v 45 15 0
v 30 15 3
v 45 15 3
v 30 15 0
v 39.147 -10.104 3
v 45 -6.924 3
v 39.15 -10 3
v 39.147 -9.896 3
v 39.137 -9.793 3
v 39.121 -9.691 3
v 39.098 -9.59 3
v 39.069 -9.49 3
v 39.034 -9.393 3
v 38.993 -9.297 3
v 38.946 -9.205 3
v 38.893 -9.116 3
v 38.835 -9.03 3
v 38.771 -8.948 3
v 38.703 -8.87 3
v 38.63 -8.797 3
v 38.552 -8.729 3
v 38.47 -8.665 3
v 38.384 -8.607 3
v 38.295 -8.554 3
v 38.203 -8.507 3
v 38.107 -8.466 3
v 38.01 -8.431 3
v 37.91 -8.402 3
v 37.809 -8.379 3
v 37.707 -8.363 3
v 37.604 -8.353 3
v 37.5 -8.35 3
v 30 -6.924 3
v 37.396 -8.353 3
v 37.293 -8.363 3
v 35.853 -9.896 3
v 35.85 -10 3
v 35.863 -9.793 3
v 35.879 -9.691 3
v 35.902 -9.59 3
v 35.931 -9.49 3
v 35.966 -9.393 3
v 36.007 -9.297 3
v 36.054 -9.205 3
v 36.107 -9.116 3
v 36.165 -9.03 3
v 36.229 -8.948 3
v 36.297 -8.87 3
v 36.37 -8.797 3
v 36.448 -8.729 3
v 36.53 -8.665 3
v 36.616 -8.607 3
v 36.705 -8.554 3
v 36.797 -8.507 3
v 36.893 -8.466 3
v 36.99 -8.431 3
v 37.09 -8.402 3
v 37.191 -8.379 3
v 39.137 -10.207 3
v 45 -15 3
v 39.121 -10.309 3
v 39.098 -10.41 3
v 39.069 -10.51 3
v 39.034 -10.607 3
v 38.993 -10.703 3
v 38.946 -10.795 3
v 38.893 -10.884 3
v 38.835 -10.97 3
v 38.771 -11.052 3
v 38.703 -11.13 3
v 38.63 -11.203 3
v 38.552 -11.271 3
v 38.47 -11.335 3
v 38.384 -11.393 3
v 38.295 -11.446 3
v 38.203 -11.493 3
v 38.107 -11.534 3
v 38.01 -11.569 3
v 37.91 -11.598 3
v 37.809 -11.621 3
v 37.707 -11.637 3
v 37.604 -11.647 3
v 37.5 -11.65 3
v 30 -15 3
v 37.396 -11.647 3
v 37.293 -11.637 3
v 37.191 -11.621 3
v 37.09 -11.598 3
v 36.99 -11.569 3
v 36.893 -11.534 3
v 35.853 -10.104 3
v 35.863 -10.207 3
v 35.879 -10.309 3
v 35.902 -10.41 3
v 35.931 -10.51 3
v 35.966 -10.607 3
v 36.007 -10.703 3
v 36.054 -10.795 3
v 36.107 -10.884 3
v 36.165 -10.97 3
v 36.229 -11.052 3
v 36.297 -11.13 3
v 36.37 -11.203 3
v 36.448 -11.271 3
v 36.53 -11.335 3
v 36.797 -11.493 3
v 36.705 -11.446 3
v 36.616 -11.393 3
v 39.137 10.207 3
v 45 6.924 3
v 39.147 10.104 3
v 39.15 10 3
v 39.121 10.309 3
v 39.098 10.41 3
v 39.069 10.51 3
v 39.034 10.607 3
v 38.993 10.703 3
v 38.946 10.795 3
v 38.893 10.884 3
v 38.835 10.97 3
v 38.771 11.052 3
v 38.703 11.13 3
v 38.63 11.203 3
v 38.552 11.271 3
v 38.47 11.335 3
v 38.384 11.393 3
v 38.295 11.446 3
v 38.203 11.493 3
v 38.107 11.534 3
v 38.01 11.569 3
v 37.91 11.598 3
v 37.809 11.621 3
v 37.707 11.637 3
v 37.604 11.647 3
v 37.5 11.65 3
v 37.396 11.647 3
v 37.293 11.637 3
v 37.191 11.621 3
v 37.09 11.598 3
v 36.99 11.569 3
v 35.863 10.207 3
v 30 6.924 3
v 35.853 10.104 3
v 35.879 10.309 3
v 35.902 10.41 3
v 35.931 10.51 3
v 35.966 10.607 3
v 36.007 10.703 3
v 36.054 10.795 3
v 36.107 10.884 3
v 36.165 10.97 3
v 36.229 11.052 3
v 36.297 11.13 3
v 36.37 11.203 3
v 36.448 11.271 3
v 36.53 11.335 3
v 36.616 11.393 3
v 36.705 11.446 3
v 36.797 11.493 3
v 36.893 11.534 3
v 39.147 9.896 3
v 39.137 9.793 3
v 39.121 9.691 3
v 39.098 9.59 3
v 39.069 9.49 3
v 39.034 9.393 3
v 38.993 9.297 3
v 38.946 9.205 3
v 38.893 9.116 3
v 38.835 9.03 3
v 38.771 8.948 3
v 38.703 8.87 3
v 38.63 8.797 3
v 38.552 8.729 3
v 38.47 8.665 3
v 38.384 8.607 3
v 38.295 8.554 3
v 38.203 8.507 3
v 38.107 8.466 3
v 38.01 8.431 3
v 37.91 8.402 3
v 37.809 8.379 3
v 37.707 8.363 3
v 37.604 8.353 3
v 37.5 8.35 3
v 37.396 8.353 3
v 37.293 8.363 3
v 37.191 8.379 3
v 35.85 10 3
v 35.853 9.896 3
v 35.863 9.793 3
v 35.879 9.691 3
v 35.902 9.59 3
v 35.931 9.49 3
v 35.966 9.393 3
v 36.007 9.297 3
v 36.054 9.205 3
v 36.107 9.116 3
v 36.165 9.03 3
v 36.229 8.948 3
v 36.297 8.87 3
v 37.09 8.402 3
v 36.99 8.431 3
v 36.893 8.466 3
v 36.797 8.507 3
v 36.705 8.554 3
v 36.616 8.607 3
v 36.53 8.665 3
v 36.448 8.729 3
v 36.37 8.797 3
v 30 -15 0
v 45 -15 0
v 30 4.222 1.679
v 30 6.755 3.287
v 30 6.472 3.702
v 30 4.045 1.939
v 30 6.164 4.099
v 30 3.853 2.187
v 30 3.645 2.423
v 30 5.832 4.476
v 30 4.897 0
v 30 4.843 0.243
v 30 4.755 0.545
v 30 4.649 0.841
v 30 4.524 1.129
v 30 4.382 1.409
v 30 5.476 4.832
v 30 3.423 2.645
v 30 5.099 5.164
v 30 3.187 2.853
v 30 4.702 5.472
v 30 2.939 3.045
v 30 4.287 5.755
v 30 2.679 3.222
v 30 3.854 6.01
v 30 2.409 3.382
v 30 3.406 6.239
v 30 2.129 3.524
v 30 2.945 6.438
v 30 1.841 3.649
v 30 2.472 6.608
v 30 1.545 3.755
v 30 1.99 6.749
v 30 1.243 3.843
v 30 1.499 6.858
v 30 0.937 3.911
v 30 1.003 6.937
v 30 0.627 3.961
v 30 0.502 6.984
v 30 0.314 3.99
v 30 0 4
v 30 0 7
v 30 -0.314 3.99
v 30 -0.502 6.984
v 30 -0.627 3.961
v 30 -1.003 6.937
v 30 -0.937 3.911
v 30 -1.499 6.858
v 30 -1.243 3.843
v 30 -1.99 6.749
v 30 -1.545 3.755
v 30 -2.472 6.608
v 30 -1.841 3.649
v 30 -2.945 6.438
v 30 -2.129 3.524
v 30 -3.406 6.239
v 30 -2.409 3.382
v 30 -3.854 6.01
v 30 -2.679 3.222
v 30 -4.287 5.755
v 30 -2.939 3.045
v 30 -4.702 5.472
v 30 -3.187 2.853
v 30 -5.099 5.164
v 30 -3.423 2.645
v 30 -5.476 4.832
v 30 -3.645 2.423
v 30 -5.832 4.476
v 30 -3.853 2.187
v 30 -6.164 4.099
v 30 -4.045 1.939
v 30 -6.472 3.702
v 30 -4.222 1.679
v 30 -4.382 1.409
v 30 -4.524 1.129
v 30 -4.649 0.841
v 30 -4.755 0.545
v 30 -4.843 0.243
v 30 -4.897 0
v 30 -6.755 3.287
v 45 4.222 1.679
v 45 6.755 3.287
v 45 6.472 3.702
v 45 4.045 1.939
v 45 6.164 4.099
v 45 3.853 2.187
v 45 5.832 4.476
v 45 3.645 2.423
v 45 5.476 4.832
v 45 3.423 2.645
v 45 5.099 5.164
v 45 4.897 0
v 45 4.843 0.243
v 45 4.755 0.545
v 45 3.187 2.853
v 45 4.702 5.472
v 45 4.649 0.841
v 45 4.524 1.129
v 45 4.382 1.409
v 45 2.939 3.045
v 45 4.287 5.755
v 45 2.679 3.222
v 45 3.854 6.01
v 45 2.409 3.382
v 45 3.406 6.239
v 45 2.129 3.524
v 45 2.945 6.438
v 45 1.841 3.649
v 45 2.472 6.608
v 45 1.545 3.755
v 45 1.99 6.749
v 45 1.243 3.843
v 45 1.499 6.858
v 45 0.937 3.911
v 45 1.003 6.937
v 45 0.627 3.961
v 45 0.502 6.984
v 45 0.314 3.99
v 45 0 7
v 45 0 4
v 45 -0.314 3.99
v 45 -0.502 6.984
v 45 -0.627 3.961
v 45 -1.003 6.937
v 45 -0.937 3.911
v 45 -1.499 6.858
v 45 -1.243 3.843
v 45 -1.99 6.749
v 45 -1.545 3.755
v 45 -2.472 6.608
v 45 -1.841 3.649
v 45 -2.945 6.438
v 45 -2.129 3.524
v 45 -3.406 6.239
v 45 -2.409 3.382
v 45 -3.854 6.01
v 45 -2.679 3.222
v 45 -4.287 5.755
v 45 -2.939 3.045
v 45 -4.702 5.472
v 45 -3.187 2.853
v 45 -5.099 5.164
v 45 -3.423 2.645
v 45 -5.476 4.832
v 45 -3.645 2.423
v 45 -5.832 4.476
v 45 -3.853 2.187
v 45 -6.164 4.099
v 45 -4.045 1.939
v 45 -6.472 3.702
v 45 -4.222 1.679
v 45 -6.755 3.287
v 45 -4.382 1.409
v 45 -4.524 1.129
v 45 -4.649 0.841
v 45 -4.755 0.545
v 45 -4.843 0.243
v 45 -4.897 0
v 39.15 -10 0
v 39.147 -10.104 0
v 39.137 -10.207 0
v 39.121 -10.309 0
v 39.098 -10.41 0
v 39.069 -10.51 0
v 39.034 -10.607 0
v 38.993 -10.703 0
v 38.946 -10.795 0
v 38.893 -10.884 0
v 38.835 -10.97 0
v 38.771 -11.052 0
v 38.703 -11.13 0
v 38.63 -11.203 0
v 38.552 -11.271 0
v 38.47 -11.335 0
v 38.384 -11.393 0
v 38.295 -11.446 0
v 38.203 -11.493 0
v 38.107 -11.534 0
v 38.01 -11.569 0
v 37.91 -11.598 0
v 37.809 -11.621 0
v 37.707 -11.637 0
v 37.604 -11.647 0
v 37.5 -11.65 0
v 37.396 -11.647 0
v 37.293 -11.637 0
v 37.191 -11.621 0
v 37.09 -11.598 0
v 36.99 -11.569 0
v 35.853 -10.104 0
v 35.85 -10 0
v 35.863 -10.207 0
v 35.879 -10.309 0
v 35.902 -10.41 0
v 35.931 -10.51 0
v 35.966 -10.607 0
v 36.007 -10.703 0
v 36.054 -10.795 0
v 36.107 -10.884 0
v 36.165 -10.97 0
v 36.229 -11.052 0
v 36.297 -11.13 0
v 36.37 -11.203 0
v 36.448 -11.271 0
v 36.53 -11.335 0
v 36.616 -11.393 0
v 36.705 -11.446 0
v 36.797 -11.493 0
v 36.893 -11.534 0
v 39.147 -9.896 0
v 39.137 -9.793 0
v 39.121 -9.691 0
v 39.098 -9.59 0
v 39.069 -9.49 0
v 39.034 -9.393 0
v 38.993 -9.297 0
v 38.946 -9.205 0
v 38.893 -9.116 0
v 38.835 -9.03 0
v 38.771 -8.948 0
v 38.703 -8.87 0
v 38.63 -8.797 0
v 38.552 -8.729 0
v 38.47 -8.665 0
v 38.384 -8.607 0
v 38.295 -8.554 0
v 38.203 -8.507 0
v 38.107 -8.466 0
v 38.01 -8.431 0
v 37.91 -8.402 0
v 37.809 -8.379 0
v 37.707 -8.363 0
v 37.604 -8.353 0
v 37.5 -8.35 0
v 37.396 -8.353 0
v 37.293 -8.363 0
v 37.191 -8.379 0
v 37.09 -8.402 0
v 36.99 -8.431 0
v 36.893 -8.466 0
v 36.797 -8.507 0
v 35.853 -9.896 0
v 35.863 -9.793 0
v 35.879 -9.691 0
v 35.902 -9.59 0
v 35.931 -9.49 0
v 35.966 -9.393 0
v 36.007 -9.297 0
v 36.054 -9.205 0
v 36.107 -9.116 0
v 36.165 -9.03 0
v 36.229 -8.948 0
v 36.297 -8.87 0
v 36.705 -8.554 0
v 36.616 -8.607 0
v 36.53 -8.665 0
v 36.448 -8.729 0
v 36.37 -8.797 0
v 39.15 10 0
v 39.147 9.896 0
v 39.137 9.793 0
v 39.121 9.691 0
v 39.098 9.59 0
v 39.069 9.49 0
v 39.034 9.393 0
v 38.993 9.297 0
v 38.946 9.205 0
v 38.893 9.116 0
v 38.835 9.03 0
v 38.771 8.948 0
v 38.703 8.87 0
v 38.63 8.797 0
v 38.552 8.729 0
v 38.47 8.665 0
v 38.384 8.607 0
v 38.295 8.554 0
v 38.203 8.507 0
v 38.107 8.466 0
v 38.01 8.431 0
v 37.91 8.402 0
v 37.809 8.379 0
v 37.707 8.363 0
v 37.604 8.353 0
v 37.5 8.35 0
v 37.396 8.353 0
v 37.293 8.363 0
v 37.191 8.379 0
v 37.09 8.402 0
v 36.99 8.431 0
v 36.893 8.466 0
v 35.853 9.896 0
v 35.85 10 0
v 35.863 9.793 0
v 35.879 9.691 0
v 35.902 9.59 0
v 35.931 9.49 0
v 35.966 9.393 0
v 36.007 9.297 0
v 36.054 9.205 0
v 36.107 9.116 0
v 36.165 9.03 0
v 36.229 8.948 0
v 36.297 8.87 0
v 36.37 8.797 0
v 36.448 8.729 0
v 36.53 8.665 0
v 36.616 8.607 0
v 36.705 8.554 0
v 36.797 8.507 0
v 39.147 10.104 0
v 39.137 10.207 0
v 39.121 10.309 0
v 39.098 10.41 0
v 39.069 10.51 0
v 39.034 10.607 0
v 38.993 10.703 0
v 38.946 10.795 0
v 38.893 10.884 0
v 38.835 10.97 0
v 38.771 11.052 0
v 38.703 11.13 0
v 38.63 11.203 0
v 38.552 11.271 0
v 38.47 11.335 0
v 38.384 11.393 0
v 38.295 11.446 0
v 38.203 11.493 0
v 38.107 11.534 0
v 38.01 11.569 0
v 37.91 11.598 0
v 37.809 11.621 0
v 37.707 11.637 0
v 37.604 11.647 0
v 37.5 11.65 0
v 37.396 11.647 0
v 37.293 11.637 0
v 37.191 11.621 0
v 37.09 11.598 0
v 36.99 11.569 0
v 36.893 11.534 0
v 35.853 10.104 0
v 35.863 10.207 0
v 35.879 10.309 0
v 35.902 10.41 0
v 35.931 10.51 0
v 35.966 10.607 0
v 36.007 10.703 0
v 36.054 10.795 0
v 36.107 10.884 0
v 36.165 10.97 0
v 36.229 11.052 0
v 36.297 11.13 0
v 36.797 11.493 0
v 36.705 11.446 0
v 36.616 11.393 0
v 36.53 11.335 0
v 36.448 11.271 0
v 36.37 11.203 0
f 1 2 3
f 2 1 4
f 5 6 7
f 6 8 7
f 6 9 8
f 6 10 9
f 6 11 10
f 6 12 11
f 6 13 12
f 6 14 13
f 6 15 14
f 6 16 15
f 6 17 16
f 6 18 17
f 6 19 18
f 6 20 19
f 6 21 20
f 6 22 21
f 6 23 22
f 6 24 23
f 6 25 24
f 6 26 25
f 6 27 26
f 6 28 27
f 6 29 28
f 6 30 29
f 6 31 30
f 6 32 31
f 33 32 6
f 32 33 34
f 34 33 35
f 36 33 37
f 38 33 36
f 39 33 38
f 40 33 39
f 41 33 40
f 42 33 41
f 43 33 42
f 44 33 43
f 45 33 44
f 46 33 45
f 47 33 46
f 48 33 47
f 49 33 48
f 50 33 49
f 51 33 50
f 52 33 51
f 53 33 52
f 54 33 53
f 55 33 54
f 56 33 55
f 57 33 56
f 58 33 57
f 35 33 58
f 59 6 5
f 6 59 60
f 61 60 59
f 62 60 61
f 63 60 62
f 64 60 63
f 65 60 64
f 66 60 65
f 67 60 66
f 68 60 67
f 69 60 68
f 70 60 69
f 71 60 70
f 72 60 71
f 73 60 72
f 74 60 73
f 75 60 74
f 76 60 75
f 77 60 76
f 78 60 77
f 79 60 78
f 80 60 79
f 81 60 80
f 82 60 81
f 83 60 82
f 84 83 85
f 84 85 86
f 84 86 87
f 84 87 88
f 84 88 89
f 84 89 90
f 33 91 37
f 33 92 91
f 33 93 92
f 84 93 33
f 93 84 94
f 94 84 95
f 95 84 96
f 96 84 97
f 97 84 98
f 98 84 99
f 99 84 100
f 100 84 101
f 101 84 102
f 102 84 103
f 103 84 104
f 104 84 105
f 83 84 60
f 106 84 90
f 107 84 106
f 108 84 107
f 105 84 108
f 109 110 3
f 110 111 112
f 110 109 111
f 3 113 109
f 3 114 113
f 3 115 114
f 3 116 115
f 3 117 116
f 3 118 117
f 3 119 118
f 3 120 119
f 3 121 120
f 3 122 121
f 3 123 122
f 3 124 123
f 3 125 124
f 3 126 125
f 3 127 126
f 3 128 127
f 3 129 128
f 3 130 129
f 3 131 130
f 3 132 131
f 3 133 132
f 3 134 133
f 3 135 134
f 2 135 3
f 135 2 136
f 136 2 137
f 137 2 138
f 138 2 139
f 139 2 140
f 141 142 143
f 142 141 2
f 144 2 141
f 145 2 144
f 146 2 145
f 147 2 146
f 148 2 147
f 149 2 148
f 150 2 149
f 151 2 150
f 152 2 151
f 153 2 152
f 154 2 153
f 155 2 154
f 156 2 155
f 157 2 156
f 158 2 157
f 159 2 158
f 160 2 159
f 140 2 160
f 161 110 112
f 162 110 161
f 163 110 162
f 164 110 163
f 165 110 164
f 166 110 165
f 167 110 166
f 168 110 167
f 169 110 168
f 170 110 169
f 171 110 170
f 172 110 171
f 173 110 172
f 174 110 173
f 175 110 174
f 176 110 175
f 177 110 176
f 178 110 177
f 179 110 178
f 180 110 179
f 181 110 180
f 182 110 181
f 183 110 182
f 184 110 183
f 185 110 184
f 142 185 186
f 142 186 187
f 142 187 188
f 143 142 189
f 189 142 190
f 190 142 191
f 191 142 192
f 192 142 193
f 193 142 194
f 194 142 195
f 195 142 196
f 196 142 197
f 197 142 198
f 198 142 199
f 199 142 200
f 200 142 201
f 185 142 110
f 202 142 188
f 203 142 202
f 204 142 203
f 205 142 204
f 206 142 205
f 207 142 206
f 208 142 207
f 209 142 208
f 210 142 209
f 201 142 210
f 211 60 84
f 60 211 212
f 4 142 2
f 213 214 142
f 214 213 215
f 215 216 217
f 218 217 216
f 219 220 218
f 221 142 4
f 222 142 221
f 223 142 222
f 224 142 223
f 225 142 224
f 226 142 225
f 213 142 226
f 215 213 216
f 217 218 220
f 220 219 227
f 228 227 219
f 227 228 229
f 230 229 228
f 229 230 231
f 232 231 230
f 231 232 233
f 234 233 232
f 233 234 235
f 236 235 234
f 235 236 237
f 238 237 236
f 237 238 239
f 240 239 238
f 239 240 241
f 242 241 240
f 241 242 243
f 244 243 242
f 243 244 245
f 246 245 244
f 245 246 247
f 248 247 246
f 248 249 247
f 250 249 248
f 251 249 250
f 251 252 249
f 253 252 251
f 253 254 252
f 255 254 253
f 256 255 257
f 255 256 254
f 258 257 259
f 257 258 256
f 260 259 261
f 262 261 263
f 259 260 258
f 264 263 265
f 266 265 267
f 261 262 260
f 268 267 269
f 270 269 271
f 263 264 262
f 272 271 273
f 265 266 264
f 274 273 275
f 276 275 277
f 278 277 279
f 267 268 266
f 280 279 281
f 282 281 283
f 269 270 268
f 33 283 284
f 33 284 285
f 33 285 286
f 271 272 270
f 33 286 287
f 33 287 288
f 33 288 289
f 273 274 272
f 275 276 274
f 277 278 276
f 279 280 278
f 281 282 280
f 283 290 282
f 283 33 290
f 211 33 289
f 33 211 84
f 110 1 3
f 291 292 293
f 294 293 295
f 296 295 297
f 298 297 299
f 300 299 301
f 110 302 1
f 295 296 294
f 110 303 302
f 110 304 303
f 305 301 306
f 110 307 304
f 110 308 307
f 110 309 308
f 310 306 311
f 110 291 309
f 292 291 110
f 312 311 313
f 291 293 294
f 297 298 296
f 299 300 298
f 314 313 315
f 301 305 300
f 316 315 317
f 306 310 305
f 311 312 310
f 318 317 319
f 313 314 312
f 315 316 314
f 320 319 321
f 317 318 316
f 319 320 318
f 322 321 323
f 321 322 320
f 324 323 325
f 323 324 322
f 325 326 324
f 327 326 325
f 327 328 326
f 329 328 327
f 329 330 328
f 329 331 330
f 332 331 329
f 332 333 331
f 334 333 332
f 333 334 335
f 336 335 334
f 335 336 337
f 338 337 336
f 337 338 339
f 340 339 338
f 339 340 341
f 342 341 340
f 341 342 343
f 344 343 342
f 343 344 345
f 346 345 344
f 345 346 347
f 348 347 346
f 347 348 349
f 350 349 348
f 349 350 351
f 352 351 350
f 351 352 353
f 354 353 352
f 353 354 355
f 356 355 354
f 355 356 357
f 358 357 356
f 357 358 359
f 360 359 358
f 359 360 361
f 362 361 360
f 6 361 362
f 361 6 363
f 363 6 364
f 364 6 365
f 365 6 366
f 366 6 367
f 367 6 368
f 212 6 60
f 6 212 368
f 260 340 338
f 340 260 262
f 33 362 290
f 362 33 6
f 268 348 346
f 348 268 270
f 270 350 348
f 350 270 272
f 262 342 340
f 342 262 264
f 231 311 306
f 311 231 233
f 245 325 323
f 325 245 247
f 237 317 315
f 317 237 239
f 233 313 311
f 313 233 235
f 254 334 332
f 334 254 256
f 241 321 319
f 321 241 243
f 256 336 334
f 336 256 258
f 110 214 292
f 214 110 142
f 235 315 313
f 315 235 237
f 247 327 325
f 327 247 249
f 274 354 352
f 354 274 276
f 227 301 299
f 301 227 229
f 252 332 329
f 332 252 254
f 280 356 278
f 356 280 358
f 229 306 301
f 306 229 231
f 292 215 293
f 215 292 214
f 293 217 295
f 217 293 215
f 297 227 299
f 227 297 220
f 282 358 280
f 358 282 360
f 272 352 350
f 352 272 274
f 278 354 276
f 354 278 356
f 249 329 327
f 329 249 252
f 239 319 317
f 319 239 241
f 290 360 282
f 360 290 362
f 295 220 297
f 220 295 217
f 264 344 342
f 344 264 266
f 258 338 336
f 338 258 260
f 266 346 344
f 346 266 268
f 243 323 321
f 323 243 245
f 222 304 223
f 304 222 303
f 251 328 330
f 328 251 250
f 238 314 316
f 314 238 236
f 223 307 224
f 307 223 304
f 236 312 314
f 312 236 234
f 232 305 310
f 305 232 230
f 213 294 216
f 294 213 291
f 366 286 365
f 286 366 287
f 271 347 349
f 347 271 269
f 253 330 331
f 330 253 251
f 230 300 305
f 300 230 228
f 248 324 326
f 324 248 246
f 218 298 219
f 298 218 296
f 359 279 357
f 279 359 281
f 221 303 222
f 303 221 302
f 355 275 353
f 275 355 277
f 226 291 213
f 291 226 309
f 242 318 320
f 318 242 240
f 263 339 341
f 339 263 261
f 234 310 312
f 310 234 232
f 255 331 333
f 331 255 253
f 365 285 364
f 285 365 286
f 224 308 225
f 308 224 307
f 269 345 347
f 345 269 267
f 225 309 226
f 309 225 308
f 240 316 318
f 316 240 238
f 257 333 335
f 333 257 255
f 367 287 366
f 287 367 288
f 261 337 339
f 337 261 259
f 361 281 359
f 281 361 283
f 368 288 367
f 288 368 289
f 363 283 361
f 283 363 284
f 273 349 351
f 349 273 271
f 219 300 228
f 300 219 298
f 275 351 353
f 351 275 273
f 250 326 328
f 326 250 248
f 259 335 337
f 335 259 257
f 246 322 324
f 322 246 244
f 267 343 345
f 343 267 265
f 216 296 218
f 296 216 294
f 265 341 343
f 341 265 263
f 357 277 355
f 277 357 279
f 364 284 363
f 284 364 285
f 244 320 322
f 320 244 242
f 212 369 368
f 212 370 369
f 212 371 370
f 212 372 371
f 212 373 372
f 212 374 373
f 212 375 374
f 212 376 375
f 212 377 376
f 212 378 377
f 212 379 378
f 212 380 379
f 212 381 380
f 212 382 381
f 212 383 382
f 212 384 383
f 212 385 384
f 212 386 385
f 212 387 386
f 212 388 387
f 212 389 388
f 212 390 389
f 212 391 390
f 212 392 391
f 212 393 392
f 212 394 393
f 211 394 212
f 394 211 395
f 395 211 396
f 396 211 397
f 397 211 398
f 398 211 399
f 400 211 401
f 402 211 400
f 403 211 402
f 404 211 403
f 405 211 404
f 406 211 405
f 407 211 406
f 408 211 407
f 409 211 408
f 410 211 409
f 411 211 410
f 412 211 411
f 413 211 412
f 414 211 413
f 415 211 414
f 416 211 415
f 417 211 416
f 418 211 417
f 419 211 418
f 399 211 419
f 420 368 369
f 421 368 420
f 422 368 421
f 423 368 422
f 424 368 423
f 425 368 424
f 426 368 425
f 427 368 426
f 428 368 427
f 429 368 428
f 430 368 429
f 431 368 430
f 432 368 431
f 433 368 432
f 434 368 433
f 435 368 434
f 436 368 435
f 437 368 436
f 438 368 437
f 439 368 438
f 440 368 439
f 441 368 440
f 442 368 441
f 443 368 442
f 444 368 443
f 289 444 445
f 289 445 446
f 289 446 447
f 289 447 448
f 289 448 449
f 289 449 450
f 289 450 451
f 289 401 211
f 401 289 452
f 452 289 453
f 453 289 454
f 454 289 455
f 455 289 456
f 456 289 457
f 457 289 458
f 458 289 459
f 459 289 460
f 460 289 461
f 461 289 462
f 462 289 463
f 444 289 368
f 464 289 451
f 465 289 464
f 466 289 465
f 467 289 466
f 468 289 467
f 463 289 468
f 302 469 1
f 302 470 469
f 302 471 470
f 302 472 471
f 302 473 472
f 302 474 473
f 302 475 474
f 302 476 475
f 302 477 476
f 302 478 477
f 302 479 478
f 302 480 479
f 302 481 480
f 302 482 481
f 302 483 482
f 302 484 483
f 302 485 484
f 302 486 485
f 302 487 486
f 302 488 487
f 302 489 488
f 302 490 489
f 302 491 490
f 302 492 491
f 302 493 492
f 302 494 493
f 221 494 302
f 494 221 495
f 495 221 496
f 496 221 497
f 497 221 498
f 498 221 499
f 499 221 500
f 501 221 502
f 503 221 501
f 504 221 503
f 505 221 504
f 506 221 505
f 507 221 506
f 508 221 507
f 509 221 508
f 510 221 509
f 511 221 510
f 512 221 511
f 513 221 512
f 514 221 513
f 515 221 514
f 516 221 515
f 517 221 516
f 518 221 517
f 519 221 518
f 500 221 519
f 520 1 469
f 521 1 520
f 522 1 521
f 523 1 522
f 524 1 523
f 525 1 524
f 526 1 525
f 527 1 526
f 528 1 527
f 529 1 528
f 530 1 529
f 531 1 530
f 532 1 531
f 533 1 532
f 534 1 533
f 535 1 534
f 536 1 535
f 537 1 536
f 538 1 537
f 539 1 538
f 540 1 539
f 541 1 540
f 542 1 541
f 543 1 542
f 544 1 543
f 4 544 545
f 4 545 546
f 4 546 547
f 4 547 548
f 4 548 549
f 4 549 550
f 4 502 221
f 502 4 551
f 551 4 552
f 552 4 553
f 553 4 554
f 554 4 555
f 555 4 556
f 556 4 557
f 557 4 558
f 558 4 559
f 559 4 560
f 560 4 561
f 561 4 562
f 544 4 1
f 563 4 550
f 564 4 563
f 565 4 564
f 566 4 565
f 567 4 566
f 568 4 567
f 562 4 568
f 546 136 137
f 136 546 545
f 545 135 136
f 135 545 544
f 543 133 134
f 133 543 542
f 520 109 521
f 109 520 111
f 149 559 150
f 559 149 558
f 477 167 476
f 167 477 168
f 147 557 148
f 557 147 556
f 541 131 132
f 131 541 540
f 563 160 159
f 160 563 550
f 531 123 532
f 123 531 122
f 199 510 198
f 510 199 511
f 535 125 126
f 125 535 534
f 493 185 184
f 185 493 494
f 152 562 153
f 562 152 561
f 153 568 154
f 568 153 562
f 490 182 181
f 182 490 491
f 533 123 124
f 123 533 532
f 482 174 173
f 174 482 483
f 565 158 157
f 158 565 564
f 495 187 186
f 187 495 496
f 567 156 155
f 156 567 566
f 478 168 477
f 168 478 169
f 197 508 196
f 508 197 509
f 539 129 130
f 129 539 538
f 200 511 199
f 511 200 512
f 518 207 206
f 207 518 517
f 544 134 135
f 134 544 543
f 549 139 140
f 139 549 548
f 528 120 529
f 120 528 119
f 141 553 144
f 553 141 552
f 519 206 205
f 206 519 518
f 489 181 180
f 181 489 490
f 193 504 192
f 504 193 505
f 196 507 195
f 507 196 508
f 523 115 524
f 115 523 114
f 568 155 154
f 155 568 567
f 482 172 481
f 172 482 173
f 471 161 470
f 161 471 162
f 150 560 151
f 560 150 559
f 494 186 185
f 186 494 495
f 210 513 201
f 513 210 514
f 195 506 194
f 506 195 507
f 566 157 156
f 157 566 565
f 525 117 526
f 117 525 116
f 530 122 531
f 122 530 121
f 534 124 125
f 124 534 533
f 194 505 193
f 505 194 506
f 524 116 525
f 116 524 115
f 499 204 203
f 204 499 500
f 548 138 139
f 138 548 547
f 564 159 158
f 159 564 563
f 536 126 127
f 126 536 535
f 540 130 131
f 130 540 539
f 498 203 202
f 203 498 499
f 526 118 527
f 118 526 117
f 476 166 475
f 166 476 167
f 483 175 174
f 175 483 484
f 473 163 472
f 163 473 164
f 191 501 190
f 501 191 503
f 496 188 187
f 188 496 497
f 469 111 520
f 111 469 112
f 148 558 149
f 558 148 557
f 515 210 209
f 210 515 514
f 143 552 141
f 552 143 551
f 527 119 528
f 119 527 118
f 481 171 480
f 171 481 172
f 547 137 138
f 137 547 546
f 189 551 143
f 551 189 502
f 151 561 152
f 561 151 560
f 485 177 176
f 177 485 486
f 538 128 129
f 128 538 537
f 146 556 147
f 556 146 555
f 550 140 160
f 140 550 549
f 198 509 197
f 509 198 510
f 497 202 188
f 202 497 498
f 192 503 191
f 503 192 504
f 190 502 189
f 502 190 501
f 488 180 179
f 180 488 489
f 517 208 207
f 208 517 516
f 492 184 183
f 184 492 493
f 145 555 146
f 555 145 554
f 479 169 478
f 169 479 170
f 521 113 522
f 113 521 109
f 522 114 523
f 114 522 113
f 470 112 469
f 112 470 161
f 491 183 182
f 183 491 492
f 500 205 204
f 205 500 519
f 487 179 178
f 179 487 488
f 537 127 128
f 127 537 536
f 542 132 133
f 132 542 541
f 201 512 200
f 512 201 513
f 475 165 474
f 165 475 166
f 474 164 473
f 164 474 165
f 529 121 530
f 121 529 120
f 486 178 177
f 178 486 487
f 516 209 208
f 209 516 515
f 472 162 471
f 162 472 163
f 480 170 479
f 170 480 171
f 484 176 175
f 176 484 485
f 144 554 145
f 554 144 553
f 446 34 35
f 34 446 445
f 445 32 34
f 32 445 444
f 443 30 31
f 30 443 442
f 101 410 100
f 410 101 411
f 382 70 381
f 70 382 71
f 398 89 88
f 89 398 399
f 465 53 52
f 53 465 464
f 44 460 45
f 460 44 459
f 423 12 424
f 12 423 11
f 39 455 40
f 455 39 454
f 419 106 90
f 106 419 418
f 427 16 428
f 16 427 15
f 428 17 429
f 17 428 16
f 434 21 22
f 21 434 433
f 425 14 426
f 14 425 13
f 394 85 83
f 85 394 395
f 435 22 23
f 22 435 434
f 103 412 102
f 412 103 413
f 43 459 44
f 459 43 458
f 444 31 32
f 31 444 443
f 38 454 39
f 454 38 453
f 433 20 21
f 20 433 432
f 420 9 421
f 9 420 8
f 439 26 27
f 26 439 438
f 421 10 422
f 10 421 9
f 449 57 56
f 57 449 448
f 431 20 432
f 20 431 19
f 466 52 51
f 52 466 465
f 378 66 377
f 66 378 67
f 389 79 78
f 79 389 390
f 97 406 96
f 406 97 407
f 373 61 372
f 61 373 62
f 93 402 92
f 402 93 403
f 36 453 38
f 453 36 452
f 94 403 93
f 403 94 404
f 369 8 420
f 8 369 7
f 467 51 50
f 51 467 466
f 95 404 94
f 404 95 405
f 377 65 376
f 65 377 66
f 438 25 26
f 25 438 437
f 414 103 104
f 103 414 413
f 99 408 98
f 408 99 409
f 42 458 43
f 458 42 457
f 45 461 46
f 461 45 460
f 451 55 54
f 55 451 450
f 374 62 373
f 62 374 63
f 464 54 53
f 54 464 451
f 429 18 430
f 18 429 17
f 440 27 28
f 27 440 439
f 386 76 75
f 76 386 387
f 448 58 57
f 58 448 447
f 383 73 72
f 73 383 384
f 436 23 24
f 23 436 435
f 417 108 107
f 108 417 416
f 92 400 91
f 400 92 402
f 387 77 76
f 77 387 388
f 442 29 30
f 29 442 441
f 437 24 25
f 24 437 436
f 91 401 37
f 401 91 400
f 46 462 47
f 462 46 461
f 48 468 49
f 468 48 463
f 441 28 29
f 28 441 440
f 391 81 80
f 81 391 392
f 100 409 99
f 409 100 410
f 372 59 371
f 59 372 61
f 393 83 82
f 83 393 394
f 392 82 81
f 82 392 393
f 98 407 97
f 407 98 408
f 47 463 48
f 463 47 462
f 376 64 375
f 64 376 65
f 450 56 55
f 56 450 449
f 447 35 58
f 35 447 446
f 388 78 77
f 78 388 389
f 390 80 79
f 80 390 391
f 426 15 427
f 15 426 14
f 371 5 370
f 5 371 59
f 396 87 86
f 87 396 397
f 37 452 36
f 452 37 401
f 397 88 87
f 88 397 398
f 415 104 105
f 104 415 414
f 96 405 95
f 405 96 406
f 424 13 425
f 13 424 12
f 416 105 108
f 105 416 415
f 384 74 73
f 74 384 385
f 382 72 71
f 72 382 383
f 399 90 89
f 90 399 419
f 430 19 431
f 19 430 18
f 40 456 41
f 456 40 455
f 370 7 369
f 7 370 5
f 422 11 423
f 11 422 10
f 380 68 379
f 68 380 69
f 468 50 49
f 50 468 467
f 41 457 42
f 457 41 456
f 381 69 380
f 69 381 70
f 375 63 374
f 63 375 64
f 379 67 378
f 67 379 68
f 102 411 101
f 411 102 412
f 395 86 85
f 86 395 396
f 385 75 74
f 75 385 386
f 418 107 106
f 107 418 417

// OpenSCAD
width = 50;
height = 90;
depth = 5;

margin = 0.3;

rod = 10;
holder_length = 15;
holder_thickness = 5;
holder_width = 30;
rounded = 3;

bolt = 5 + margin;
holder_bolt = 3 + margin;

m3_diameter = 3.6;
m3_nut_diameter = 5.3;
m3_nut_diameter_horizontal = 6.1;
m3_nut_diameter_bigger = ((m3_nut_diameter  / 2) / cos (180 / 6))*2;

nut_trap_depth = 2;

space = 1;
alu_x = 20;

module plate()
{
	hull()
	{
		translate([width/2-rounded/2,height/2-rounded/2,0]) cylinder(depth,r=rounded/2,$fn=100,true);
		translate([width/2-rounded/2,-height/2+rounded/2,0]) cylinder(depth,r=rounded/2,$fn=100,true);
		translate([-width/2+rounded/2,height/2-rounded/2,0]) cylinder(depth,r=rounded/2,$fn=100,true);
		translate([-width/2+rounded/2,-height/2+rounded/2,0]) cylinder(depth,r=rounded/2,$fn=100,true);
	}
}

module rod_holder()
{
	difference()
	{
		translate([-holder_width/2, 0, depth]) cube([holder_width,holder_thickness,holder_length]);
		
		translate([holder_width/2-rod/2,holder_thickness/2,depth+holder_length/2])
		rotate([90,0,0])
		cylinder(holder_thickness+10, r=holder_bolt/2,$fn=100,center=true);

		translate([-holder_width/2+rod/2,holder_thickness/2,depth+holder_length/2])
		rotate([90,0,0])
		cylinder(holder_thickness+10, r=holder_bolt/2,$fn=100,center=true);

		translate([holder_width/2-rod/2,holder_thickness+1,depth+holder_length/2])
		rotate([90,0,0])
		cylinder(r=m3_nut_diameter_bigger/2, h=nut_trap_depth+1, $fn=6);

		translate([-holder_width/2+rod/2,holder_thickness+1,depth+holder_length/2])
		rotate([90,0,0])
		cylinder(r=m3_nut_diameter_bigger/2, h=nut_trap_depth+1, $fn=6);
	}
}

//main



translate([width/2+holder_length/2+5,0,0])
rotate([0,0,90])
//translate([0,-space,depth+holder_length/2])
//rotate([90,0,0])
{
	difference()
	{
		union()
		{
			cube([holder_width,holder_length,6],center=true);
			translate([0,0,-space])
			rotate([90,0,0]) cylinder(holder_length,d=rod+6,$fn=100,center=true);
		}

		translate([0,0,-1])
		rotate([90,0,0]) cylinder(holder_length+5,d=rod,$fn=100,center=true);
		
		translate([0,0,(-holder_thickness-rod)/2])
		cube([holder_width+2,holder_length+2,holder_thickness+rod],center=true);

		translate([holder_width/2-rod/2,0,0])
		cylinder(holder_thickness+1,d=holder_bolt,$fn=100,center=true);		

		translate([-holder_width/2+rod/2,0,0])
		cylinder(holder_thickness+1,d=holder_bolt,$fn=100,center=true);		
	}
}
